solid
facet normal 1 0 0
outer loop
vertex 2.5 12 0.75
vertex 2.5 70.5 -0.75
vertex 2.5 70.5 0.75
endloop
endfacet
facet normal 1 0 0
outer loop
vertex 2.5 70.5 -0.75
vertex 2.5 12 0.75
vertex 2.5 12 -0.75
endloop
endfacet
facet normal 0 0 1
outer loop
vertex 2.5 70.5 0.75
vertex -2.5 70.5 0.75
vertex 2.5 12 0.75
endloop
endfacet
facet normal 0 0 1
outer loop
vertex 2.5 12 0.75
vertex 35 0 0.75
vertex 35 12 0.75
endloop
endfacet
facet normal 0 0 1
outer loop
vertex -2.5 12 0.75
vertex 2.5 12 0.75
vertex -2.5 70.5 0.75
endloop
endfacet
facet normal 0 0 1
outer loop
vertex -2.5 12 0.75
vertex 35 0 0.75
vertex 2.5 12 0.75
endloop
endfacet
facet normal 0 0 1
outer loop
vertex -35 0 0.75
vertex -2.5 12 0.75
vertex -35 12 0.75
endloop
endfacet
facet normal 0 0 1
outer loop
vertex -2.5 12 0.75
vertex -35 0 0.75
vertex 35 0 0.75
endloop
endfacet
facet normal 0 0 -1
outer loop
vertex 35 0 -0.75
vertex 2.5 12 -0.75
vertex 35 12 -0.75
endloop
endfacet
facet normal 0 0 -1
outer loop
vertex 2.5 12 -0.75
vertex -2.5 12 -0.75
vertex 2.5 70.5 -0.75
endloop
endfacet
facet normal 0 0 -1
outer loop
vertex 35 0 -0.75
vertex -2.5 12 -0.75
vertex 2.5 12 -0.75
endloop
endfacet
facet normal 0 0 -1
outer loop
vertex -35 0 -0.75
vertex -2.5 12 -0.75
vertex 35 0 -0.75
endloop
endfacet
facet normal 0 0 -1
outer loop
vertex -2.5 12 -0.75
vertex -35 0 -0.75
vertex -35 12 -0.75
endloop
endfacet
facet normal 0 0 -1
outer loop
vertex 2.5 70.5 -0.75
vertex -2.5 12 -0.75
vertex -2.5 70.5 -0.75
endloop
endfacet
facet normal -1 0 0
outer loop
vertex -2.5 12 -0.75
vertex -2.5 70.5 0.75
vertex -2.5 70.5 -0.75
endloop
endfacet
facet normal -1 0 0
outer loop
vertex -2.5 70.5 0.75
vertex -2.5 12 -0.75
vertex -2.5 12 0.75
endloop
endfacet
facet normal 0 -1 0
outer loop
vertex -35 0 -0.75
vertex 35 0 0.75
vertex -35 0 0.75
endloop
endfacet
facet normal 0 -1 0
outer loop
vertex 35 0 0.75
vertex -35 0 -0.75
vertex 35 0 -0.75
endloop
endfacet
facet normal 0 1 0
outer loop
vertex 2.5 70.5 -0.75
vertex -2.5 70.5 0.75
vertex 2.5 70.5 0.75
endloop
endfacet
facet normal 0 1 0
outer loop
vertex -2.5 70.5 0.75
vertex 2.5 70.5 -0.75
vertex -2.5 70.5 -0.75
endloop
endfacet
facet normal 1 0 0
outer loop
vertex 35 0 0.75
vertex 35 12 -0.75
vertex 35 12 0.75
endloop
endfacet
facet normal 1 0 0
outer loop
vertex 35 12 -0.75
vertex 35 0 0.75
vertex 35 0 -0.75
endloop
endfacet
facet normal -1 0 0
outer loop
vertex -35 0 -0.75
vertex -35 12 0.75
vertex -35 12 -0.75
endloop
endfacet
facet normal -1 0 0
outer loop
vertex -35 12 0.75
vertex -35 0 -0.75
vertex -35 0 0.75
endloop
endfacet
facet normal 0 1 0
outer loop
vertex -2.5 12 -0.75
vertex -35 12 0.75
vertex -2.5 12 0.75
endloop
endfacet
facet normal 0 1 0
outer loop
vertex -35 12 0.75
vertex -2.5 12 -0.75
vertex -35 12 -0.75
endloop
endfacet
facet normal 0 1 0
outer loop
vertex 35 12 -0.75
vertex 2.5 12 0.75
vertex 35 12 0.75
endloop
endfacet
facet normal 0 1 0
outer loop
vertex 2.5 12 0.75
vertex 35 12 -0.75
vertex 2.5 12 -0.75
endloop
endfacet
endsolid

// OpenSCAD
// Dimensions for the 10-well agarose gel comb
// All units in millimetres

// Overall Geometry
plate_thickness = 1.5;   // Thickness of the flat plate (Z)
spine_length = 70;       // Length of the spine (X)
spine_width = 12;        // Width of the spine (Y)

// Tooth Geometry
tooth_width = 5.0;       // Width of a single tooth (X)
tooth_length = 12;       // Length of a single tooth (Y)
tooth_gap = 1.5;         // Gap between neighbouring teeth (Y)

// Positioning
num_teeth = 10;          // Number of teeth on the comb
tooth_offset = 0.0;      // Offset of the first tooth from the spine edge (Y)

// Rendering
$fn = 64;               // High resolution for curved surfaces

// Main Body
module gel_comb() {
    union() {
        // The Spine (Back bar)
        translate([0, spine_width / 2, 0])
            cube([spine_length, spine_width, plate_thickness], center = true);

        // The Teeth
        // Calculate total width occupied by teeth and gaps
        total_teeth_width = num_teeth * tooth_width;
        total_gaps_width = (num_teeth - 1) * tooth_gap;
        total_row_width = total_teeth_width + total_gaps_width;

        // Calculate starting Y position to center the row of teeth
        // The row starts at the edge of the spine (Y = spine_width/2)
        // and extends into -Y.
        start_y = (spine_width / 2) + tooth_offset;

        for (i = [0 : num_teeth - 1]) {
            // Calculate Y position for each tooth
            // The first tooth is at start_y, the next is start_y + tooth_width + tooth_gap, etc.
            current_y = start_y + i * (tooth_width + tooth_gap);

            translate([0, current_y, 0])
                cube([tooth_width, tooth_length, plate_thickness], center = true);
        }
    }
}

// Render the part
gel_comb();
